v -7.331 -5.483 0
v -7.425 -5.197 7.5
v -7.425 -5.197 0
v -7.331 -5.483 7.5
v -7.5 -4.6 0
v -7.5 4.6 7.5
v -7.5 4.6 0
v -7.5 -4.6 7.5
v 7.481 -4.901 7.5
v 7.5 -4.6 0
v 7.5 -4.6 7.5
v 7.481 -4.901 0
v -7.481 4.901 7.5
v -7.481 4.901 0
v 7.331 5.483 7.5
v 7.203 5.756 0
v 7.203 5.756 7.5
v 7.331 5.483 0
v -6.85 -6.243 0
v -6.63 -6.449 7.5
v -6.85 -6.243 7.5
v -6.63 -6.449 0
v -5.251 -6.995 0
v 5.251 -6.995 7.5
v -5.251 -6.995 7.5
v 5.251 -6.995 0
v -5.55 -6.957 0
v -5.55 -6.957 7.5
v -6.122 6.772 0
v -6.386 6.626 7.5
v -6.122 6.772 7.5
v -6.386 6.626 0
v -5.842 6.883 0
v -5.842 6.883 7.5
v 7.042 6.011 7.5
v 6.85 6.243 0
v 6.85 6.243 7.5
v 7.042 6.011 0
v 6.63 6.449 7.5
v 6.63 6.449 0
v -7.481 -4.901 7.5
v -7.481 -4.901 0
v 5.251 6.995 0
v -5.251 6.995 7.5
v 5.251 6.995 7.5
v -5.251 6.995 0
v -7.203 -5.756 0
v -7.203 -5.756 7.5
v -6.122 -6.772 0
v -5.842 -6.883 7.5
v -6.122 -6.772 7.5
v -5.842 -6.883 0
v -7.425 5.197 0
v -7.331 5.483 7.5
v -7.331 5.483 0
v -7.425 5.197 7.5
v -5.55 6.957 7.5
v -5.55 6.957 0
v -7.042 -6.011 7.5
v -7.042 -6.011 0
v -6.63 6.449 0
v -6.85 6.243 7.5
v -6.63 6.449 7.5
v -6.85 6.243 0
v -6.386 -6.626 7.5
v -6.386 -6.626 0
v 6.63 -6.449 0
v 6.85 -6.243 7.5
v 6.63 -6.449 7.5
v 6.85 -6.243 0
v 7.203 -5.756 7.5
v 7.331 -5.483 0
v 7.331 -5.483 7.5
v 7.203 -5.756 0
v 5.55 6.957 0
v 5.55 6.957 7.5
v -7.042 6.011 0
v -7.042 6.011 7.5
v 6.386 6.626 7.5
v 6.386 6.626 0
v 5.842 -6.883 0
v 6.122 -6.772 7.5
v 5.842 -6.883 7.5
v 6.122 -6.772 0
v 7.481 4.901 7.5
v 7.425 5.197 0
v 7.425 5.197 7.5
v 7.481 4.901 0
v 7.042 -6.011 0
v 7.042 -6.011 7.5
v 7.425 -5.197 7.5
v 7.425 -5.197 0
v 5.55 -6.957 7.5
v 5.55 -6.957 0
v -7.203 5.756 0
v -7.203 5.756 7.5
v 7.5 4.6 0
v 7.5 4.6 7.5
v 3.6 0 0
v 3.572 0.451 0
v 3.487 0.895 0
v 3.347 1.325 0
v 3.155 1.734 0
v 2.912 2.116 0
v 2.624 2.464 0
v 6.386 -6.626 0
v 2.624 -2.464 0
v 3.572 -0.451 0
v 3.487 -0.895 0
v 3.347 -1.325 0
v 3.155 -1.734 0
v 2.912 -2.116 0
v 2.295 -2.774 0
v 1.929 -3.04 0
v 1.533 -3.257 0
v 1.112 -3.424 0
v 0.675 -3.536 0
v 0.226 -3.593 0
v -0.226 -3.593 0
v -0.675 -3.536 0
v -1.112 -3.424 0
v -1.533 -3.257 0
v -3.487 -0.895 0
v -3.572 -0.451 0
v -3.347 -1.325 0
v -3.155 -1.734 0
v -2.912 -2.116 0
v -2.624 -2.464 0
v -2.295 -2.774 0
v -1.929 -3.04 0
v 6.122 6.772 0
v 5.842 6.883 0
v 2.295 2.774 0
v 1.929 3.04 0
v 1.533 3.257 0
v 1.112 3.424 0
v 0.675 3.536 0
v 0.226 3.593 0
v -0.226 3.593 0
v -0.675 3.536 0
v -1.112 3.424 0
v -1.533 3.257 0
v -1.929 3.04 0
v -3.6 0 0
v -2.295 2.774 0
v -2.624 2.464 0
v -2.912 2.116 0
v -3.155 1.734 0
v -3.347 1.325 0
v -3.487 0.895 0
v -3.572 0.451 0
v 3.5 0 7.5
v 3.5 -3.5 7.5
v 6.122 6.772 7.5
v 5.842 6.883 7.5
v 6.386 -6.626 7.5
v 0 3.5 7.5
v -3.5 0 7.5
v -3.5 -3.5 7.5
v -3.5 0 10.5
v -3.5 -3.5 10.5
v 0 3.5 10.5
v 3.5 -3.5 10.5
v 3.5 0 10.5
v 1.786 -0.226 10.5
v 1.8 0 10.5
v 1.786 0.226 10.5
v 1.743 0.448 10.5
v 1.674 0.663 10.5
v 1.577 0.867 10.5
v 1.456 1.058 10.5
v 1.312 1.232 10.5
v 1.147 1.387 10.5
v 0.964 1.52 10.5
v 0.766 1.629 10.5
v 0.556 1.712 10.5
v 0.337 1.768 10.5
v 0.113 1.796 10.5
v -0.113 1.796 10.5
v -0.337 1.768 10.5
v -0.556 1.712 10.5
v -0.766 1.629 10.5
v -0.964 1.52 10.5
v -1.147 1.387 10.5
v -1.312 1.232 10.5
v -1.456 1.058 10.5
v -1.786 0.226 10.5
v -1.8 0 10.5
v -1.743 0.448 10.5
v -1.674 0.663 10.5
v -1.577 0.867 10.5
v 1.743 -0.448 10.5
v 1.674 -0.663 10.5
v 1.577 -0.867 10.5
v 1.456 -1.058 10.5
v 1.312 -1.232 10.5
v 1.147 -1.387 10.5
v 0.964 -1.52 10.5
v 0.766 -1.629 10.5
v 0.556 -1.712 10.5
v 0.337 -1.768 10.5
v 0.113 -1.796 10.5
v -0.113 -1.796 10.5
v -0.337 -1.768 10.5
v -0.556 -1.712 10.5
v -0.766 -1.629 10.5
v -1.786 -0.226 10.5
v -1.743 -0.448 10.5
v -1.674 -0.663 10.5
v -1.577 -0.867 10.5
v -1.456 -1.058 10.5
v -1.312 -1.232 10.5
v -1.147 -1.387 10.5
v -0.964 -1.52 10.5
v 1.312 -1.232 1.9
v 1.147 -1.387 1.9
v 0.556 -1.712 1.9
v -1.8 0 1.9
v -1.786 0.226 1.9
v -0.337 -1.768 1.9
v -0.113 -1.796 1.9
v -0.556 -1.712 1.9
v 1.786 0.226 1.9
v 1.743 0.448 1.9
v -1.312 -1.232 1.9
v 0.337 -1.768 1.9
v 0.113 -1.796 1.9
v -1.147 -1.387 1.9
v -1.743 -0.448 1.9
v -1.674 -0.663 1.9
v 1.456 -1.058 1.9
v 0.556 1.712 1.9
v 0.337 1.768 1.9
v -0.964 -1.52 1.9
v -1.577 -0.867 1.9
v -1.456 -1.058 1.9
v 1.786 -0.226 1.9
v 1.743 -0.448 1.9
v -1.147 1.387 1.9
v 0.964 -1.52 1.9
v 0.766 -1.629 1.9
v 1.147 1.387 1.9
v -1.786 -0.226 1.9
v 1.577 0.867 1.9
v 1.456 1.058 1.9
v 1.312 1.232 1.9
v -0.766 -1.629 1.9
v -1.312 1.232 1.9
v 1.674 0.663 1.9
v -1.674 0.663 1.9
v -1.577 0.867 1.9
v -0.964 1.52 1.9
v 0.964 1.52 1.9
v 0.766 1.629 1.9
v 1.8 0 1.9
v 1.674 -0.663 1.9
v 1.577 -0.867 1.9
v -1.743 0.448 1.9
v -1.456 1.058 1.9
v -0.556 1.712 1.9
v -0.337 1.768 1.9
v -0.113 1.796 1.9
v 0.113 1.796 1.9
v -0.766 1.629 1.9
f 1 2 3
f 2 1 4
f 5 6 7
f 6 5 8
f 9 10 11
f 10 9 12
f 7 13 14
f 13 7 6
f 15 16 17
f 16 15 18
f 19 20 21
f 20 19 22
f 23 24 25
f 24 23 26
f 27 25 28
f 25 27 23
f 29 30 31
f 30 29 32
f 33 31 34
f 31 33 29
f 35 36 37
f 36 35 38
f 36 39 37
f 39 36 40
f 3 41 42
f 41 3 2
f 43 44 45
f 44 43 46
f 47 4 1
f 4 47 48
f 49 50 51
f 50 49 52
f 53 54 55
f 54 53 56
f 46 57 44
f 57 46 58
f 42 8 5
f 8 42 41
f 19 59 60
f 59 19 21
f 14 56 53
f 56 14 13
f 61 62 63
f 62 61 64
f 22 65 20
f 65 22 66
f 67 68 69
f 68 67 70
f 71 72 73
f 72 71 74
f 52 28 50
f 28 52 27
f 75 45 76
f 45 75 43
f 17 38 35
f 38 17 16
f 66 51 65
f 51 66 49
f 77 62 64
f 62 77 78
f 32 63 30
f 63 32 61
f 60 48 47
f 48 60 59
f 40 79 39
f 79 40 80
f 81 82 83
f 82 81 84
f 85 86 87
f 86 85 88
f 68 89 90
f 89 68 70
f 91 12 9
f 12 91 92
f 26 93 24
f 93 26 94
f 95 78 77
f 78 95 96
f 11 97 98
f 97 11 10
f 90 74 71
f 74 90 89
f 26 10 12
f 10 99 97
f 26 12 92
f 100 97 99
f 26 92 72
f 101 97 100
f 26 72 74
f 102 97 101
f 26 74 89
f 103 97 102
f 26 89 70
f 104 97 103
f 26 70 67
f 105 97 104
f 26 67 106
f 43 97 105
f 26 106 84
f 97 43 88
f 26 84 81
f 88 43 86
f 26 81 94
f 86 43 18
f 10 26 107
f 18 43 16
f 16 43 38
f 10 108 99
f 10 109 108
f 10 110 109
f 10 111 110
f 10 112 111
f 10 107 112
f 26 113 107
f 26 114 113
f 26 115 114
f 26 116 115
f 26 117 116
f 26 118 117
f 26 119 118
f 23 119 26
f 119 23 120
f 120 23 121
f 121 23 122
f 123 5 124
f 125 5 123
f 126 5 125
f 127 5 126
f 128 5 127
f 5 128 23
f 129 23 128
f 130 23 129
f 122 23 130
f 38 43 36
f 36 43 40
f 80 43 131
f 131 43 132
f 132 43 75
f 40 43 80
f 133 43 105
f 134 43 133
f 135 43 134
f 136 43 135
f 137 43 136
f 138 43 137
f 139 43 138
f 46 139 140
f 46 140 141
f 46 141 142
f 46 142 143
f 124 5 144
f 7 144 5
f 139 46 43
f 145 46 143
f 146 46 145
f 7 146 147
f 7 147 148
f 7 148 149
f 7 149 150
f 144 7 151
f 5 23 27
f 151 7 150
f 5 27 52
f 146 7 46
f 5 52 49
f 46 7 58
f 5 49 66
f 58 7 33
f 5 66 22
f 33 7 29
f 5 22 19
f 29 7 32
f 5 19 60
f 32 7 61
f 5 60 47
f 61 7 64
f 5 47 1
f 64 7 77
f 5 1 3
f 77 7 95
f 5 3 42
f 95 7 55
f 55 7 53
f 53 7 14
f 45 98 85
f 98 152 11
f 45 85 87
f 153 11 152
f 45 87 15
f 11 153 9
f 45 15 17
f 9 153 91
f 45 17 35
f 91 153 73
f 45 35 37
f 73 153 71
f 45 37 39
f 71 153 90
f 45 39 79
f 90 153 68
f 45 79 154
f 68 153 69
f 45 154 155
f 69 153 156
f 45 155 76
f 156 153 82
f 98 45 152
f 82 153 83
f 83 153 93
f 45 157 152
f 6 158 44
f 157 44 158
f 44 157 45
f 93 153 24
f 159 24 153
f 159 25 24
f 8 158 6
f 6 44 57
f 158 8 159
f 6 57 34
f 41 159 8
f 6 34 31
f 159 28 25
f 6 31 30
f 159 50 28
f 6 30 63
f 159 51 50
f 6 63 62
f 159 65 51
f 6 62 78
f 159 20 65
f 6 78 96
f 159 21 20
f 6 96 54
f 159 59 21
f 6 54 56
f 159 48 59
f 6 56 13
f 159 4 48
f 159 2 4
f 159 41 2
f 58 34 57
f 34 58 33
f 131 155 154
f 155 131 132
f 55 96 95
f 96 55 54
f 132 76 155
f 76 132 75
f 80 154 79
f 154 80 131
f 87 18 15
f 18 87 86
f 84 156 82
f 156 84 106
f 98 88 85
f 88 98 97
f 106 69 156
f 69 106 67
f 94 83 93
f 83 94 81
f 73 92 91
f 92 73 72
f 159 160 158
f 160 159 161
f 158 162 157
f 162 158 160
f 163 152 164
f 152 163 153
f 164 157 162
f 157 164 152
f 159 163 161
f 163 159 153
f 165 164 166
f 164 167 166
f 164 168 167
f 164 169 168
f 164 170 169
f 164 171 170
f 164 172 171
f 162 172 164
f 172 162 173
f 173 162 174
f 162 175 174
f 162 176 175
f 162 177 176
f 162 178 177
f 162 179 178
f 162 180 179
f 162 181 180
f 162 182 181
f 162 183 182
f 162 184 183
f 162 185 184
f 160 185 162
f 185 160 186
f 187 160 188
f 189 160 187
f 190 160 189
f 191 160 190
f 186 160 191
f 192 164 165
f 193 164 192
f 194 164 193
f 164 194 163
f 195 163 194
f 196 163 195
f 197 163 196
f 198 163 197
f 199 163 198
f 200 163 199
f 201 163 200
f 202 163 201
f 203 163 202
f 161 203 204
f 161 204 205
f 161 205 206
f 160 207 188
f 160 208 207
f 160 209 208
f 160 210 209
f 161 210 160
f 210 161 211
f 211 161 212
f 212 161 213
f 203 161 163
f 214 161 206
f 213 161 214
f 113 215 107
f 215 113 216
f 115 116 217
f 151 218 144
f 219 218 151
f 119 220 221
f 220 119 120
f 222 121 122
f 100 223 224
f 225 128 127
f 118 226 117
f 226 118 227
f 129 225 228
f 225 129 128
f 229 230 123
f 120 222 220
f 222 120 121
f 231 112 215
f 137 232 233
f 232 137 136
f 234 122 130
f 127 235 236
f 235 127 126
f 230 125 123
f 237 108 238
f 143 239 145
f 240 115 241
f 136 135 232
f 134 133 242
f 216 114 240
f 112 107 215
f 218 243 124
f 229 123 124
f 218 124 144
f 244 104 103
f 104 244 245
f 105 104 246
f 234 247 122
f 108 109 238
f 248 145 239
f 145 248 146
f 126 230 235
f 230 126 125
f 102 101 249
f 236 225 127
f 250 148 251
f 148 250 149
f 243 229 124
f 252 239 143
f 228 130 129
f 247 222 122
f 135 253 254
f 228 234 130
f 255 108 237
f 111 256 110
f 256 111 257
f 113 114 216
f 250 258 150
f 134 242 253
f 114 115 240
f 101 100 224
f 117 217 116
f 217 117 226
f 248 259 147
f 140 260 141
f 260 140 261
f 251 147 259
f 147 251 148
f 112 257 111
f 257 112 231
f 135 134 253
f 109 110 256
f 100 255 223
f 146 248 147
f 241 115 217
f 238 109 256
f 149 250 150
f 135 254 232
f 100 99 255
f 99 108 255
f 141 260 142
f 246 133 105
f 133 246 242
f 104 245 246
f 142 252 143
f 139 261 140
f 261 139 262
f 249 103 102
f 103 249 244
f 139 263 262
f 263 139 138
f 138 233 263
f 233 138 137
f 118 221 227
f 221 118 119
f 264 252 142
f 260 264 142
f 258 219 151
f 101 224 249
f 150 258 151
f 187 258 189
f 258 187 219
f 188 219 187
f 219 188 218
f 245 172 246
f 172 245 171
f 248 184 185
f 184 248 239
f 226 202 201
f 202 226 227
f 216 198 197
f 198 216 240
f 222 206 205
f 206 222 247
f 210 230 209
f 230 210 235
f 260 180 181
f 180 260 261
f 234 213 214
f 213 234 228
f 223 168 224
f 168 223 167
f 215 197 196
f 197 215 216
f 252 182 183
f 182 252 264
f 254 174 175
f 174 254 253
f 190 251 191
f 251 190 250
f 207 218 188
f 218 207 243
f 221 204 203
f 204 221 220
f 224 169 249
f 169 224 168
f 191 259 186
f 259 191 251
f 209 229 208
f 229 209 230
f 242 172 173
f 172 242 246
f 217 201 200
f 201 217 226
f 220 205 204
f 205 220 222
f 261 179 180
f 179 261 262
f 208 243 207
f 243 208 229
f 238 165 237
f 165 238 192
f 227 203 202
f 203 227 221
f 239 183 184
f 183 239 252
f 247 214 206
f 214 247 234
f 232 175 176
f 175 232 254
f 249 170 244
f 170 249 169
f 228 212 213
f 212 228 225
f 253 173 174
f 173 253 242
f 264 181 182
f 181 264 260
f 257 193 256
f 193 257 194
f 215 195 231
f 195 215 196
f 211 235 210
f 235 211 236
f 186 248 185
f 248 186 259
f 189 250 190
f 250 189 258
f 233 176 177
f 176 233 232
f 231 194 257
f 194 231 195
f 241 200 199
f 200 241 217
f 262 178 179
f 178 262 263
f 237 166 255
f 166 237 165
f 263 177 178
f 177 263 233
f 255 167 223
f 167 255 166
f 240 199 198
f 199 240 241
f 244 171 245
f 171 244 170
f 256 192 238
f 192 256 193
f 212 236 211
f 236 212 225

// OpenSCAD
$fn = 50;

difference() {
	union() {
		translate(v = [0, 0, 0]) {
			rotate(a = [0, 0, 0]) {
				difference() {
					union() {
						hull() {
							translate(v = [-5.1, 4.6, 0]) {
								cylinder(h = 7.5, r = 2.4);
							}
							translate(v = [5.1, 4.6, 0]) {
								cylinder(h = 7.5, r = 2.4);
							}
							translate(v = [-5.1, -4.6, 0]) {
								cylinder(h = 7.5, r = 2.4);
							}
							translate(v = [5.1, -4.6, 0]) {
								cylinder(h = 7.5, r = 2.4);
							}
						}
						translate(v = [0, -5, 7.4]) {
							linear_extrude(height = 3.1) {
								polygon(points = [[-3.5, 1.5], [3.5, 1.5], [3.5, 5], [0, 8.5], [-3.5, 5]]);
							}
						}
					}
					union() {
						translate(v = [0, 0.0, 0]) {
							rotate(a = [0, 180, 0]) {
								difference() {
									union() {
										translate(v = [0, 0, -16.0]) {
											cylinder(h = 16.0, r = 1.5);
										}
										translate(v = [0, 0, -1.9]) {
											cylinder(h = 1.9, r1 = 1.8, r2 = 3.6);
										}
										cylinder(h = 250, r = 3.6);
										translate(v = [0, 0, -16.0]) {
											cylinder(h = 16.0, r = 1.8);
										}
										translate(v = [0, 0, -16.0]) {
											cylinder(h = 16.0, r = 1.5);
										}
									}
									union();
								}
							}
						}
					}
				}
			}
		}
	}
	union();
}
